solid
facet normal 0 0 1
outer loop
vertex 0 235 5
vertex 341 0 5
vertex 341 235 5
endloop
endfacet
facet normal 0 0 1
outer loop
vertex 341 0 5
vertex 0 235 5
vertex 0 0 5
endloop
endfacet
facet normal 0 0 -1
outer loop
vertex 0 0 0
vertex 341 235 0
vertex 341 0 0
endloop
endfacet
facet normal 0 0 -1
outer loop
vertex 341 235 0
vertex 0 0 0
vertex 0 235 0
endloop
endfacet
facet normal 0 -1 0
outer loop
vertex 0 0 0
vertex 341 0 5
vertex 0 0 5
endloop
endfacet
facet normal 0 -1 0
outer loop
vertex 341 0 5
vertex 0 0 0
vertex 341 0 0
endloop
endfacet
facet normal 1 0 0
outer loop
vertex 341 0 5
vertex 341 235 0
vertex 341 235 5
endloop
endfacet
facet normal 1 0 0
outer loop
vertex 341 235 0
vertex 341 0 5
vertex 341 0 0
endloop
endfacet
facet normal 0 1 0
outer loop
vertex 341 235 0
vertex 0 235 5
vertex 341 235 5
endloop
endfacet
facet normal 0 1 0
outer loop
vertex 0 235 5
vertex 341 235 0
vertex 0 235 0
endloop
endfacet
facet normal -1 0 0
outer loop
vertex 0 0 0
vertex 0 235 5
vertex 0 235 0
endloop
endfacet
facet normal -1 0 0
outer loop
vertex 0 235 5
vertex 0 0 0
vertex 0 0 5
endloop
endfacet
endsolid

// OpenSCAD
// file: constants.scad
// All measures are in mm

thickness_1 = 5;

main_body_thickness = 40;

basis_width = 331;
basis_depth = 225;
basis_height = thickness_1;
// M2.5
basis_grid_screw_diameter = 2.7;


// Every keyboard should redefine these variables
keyboard_length = 305.5;
keyboard_width = 164;
keyboard_height = 13.5;
// main file
include <constants.scad>;

module Top() {
  echo("Rendering the basis top");
  cube([basis_width + 2*thickness_1, basis_depth + 2*thickness_1, basis_height]);
}

Top();
